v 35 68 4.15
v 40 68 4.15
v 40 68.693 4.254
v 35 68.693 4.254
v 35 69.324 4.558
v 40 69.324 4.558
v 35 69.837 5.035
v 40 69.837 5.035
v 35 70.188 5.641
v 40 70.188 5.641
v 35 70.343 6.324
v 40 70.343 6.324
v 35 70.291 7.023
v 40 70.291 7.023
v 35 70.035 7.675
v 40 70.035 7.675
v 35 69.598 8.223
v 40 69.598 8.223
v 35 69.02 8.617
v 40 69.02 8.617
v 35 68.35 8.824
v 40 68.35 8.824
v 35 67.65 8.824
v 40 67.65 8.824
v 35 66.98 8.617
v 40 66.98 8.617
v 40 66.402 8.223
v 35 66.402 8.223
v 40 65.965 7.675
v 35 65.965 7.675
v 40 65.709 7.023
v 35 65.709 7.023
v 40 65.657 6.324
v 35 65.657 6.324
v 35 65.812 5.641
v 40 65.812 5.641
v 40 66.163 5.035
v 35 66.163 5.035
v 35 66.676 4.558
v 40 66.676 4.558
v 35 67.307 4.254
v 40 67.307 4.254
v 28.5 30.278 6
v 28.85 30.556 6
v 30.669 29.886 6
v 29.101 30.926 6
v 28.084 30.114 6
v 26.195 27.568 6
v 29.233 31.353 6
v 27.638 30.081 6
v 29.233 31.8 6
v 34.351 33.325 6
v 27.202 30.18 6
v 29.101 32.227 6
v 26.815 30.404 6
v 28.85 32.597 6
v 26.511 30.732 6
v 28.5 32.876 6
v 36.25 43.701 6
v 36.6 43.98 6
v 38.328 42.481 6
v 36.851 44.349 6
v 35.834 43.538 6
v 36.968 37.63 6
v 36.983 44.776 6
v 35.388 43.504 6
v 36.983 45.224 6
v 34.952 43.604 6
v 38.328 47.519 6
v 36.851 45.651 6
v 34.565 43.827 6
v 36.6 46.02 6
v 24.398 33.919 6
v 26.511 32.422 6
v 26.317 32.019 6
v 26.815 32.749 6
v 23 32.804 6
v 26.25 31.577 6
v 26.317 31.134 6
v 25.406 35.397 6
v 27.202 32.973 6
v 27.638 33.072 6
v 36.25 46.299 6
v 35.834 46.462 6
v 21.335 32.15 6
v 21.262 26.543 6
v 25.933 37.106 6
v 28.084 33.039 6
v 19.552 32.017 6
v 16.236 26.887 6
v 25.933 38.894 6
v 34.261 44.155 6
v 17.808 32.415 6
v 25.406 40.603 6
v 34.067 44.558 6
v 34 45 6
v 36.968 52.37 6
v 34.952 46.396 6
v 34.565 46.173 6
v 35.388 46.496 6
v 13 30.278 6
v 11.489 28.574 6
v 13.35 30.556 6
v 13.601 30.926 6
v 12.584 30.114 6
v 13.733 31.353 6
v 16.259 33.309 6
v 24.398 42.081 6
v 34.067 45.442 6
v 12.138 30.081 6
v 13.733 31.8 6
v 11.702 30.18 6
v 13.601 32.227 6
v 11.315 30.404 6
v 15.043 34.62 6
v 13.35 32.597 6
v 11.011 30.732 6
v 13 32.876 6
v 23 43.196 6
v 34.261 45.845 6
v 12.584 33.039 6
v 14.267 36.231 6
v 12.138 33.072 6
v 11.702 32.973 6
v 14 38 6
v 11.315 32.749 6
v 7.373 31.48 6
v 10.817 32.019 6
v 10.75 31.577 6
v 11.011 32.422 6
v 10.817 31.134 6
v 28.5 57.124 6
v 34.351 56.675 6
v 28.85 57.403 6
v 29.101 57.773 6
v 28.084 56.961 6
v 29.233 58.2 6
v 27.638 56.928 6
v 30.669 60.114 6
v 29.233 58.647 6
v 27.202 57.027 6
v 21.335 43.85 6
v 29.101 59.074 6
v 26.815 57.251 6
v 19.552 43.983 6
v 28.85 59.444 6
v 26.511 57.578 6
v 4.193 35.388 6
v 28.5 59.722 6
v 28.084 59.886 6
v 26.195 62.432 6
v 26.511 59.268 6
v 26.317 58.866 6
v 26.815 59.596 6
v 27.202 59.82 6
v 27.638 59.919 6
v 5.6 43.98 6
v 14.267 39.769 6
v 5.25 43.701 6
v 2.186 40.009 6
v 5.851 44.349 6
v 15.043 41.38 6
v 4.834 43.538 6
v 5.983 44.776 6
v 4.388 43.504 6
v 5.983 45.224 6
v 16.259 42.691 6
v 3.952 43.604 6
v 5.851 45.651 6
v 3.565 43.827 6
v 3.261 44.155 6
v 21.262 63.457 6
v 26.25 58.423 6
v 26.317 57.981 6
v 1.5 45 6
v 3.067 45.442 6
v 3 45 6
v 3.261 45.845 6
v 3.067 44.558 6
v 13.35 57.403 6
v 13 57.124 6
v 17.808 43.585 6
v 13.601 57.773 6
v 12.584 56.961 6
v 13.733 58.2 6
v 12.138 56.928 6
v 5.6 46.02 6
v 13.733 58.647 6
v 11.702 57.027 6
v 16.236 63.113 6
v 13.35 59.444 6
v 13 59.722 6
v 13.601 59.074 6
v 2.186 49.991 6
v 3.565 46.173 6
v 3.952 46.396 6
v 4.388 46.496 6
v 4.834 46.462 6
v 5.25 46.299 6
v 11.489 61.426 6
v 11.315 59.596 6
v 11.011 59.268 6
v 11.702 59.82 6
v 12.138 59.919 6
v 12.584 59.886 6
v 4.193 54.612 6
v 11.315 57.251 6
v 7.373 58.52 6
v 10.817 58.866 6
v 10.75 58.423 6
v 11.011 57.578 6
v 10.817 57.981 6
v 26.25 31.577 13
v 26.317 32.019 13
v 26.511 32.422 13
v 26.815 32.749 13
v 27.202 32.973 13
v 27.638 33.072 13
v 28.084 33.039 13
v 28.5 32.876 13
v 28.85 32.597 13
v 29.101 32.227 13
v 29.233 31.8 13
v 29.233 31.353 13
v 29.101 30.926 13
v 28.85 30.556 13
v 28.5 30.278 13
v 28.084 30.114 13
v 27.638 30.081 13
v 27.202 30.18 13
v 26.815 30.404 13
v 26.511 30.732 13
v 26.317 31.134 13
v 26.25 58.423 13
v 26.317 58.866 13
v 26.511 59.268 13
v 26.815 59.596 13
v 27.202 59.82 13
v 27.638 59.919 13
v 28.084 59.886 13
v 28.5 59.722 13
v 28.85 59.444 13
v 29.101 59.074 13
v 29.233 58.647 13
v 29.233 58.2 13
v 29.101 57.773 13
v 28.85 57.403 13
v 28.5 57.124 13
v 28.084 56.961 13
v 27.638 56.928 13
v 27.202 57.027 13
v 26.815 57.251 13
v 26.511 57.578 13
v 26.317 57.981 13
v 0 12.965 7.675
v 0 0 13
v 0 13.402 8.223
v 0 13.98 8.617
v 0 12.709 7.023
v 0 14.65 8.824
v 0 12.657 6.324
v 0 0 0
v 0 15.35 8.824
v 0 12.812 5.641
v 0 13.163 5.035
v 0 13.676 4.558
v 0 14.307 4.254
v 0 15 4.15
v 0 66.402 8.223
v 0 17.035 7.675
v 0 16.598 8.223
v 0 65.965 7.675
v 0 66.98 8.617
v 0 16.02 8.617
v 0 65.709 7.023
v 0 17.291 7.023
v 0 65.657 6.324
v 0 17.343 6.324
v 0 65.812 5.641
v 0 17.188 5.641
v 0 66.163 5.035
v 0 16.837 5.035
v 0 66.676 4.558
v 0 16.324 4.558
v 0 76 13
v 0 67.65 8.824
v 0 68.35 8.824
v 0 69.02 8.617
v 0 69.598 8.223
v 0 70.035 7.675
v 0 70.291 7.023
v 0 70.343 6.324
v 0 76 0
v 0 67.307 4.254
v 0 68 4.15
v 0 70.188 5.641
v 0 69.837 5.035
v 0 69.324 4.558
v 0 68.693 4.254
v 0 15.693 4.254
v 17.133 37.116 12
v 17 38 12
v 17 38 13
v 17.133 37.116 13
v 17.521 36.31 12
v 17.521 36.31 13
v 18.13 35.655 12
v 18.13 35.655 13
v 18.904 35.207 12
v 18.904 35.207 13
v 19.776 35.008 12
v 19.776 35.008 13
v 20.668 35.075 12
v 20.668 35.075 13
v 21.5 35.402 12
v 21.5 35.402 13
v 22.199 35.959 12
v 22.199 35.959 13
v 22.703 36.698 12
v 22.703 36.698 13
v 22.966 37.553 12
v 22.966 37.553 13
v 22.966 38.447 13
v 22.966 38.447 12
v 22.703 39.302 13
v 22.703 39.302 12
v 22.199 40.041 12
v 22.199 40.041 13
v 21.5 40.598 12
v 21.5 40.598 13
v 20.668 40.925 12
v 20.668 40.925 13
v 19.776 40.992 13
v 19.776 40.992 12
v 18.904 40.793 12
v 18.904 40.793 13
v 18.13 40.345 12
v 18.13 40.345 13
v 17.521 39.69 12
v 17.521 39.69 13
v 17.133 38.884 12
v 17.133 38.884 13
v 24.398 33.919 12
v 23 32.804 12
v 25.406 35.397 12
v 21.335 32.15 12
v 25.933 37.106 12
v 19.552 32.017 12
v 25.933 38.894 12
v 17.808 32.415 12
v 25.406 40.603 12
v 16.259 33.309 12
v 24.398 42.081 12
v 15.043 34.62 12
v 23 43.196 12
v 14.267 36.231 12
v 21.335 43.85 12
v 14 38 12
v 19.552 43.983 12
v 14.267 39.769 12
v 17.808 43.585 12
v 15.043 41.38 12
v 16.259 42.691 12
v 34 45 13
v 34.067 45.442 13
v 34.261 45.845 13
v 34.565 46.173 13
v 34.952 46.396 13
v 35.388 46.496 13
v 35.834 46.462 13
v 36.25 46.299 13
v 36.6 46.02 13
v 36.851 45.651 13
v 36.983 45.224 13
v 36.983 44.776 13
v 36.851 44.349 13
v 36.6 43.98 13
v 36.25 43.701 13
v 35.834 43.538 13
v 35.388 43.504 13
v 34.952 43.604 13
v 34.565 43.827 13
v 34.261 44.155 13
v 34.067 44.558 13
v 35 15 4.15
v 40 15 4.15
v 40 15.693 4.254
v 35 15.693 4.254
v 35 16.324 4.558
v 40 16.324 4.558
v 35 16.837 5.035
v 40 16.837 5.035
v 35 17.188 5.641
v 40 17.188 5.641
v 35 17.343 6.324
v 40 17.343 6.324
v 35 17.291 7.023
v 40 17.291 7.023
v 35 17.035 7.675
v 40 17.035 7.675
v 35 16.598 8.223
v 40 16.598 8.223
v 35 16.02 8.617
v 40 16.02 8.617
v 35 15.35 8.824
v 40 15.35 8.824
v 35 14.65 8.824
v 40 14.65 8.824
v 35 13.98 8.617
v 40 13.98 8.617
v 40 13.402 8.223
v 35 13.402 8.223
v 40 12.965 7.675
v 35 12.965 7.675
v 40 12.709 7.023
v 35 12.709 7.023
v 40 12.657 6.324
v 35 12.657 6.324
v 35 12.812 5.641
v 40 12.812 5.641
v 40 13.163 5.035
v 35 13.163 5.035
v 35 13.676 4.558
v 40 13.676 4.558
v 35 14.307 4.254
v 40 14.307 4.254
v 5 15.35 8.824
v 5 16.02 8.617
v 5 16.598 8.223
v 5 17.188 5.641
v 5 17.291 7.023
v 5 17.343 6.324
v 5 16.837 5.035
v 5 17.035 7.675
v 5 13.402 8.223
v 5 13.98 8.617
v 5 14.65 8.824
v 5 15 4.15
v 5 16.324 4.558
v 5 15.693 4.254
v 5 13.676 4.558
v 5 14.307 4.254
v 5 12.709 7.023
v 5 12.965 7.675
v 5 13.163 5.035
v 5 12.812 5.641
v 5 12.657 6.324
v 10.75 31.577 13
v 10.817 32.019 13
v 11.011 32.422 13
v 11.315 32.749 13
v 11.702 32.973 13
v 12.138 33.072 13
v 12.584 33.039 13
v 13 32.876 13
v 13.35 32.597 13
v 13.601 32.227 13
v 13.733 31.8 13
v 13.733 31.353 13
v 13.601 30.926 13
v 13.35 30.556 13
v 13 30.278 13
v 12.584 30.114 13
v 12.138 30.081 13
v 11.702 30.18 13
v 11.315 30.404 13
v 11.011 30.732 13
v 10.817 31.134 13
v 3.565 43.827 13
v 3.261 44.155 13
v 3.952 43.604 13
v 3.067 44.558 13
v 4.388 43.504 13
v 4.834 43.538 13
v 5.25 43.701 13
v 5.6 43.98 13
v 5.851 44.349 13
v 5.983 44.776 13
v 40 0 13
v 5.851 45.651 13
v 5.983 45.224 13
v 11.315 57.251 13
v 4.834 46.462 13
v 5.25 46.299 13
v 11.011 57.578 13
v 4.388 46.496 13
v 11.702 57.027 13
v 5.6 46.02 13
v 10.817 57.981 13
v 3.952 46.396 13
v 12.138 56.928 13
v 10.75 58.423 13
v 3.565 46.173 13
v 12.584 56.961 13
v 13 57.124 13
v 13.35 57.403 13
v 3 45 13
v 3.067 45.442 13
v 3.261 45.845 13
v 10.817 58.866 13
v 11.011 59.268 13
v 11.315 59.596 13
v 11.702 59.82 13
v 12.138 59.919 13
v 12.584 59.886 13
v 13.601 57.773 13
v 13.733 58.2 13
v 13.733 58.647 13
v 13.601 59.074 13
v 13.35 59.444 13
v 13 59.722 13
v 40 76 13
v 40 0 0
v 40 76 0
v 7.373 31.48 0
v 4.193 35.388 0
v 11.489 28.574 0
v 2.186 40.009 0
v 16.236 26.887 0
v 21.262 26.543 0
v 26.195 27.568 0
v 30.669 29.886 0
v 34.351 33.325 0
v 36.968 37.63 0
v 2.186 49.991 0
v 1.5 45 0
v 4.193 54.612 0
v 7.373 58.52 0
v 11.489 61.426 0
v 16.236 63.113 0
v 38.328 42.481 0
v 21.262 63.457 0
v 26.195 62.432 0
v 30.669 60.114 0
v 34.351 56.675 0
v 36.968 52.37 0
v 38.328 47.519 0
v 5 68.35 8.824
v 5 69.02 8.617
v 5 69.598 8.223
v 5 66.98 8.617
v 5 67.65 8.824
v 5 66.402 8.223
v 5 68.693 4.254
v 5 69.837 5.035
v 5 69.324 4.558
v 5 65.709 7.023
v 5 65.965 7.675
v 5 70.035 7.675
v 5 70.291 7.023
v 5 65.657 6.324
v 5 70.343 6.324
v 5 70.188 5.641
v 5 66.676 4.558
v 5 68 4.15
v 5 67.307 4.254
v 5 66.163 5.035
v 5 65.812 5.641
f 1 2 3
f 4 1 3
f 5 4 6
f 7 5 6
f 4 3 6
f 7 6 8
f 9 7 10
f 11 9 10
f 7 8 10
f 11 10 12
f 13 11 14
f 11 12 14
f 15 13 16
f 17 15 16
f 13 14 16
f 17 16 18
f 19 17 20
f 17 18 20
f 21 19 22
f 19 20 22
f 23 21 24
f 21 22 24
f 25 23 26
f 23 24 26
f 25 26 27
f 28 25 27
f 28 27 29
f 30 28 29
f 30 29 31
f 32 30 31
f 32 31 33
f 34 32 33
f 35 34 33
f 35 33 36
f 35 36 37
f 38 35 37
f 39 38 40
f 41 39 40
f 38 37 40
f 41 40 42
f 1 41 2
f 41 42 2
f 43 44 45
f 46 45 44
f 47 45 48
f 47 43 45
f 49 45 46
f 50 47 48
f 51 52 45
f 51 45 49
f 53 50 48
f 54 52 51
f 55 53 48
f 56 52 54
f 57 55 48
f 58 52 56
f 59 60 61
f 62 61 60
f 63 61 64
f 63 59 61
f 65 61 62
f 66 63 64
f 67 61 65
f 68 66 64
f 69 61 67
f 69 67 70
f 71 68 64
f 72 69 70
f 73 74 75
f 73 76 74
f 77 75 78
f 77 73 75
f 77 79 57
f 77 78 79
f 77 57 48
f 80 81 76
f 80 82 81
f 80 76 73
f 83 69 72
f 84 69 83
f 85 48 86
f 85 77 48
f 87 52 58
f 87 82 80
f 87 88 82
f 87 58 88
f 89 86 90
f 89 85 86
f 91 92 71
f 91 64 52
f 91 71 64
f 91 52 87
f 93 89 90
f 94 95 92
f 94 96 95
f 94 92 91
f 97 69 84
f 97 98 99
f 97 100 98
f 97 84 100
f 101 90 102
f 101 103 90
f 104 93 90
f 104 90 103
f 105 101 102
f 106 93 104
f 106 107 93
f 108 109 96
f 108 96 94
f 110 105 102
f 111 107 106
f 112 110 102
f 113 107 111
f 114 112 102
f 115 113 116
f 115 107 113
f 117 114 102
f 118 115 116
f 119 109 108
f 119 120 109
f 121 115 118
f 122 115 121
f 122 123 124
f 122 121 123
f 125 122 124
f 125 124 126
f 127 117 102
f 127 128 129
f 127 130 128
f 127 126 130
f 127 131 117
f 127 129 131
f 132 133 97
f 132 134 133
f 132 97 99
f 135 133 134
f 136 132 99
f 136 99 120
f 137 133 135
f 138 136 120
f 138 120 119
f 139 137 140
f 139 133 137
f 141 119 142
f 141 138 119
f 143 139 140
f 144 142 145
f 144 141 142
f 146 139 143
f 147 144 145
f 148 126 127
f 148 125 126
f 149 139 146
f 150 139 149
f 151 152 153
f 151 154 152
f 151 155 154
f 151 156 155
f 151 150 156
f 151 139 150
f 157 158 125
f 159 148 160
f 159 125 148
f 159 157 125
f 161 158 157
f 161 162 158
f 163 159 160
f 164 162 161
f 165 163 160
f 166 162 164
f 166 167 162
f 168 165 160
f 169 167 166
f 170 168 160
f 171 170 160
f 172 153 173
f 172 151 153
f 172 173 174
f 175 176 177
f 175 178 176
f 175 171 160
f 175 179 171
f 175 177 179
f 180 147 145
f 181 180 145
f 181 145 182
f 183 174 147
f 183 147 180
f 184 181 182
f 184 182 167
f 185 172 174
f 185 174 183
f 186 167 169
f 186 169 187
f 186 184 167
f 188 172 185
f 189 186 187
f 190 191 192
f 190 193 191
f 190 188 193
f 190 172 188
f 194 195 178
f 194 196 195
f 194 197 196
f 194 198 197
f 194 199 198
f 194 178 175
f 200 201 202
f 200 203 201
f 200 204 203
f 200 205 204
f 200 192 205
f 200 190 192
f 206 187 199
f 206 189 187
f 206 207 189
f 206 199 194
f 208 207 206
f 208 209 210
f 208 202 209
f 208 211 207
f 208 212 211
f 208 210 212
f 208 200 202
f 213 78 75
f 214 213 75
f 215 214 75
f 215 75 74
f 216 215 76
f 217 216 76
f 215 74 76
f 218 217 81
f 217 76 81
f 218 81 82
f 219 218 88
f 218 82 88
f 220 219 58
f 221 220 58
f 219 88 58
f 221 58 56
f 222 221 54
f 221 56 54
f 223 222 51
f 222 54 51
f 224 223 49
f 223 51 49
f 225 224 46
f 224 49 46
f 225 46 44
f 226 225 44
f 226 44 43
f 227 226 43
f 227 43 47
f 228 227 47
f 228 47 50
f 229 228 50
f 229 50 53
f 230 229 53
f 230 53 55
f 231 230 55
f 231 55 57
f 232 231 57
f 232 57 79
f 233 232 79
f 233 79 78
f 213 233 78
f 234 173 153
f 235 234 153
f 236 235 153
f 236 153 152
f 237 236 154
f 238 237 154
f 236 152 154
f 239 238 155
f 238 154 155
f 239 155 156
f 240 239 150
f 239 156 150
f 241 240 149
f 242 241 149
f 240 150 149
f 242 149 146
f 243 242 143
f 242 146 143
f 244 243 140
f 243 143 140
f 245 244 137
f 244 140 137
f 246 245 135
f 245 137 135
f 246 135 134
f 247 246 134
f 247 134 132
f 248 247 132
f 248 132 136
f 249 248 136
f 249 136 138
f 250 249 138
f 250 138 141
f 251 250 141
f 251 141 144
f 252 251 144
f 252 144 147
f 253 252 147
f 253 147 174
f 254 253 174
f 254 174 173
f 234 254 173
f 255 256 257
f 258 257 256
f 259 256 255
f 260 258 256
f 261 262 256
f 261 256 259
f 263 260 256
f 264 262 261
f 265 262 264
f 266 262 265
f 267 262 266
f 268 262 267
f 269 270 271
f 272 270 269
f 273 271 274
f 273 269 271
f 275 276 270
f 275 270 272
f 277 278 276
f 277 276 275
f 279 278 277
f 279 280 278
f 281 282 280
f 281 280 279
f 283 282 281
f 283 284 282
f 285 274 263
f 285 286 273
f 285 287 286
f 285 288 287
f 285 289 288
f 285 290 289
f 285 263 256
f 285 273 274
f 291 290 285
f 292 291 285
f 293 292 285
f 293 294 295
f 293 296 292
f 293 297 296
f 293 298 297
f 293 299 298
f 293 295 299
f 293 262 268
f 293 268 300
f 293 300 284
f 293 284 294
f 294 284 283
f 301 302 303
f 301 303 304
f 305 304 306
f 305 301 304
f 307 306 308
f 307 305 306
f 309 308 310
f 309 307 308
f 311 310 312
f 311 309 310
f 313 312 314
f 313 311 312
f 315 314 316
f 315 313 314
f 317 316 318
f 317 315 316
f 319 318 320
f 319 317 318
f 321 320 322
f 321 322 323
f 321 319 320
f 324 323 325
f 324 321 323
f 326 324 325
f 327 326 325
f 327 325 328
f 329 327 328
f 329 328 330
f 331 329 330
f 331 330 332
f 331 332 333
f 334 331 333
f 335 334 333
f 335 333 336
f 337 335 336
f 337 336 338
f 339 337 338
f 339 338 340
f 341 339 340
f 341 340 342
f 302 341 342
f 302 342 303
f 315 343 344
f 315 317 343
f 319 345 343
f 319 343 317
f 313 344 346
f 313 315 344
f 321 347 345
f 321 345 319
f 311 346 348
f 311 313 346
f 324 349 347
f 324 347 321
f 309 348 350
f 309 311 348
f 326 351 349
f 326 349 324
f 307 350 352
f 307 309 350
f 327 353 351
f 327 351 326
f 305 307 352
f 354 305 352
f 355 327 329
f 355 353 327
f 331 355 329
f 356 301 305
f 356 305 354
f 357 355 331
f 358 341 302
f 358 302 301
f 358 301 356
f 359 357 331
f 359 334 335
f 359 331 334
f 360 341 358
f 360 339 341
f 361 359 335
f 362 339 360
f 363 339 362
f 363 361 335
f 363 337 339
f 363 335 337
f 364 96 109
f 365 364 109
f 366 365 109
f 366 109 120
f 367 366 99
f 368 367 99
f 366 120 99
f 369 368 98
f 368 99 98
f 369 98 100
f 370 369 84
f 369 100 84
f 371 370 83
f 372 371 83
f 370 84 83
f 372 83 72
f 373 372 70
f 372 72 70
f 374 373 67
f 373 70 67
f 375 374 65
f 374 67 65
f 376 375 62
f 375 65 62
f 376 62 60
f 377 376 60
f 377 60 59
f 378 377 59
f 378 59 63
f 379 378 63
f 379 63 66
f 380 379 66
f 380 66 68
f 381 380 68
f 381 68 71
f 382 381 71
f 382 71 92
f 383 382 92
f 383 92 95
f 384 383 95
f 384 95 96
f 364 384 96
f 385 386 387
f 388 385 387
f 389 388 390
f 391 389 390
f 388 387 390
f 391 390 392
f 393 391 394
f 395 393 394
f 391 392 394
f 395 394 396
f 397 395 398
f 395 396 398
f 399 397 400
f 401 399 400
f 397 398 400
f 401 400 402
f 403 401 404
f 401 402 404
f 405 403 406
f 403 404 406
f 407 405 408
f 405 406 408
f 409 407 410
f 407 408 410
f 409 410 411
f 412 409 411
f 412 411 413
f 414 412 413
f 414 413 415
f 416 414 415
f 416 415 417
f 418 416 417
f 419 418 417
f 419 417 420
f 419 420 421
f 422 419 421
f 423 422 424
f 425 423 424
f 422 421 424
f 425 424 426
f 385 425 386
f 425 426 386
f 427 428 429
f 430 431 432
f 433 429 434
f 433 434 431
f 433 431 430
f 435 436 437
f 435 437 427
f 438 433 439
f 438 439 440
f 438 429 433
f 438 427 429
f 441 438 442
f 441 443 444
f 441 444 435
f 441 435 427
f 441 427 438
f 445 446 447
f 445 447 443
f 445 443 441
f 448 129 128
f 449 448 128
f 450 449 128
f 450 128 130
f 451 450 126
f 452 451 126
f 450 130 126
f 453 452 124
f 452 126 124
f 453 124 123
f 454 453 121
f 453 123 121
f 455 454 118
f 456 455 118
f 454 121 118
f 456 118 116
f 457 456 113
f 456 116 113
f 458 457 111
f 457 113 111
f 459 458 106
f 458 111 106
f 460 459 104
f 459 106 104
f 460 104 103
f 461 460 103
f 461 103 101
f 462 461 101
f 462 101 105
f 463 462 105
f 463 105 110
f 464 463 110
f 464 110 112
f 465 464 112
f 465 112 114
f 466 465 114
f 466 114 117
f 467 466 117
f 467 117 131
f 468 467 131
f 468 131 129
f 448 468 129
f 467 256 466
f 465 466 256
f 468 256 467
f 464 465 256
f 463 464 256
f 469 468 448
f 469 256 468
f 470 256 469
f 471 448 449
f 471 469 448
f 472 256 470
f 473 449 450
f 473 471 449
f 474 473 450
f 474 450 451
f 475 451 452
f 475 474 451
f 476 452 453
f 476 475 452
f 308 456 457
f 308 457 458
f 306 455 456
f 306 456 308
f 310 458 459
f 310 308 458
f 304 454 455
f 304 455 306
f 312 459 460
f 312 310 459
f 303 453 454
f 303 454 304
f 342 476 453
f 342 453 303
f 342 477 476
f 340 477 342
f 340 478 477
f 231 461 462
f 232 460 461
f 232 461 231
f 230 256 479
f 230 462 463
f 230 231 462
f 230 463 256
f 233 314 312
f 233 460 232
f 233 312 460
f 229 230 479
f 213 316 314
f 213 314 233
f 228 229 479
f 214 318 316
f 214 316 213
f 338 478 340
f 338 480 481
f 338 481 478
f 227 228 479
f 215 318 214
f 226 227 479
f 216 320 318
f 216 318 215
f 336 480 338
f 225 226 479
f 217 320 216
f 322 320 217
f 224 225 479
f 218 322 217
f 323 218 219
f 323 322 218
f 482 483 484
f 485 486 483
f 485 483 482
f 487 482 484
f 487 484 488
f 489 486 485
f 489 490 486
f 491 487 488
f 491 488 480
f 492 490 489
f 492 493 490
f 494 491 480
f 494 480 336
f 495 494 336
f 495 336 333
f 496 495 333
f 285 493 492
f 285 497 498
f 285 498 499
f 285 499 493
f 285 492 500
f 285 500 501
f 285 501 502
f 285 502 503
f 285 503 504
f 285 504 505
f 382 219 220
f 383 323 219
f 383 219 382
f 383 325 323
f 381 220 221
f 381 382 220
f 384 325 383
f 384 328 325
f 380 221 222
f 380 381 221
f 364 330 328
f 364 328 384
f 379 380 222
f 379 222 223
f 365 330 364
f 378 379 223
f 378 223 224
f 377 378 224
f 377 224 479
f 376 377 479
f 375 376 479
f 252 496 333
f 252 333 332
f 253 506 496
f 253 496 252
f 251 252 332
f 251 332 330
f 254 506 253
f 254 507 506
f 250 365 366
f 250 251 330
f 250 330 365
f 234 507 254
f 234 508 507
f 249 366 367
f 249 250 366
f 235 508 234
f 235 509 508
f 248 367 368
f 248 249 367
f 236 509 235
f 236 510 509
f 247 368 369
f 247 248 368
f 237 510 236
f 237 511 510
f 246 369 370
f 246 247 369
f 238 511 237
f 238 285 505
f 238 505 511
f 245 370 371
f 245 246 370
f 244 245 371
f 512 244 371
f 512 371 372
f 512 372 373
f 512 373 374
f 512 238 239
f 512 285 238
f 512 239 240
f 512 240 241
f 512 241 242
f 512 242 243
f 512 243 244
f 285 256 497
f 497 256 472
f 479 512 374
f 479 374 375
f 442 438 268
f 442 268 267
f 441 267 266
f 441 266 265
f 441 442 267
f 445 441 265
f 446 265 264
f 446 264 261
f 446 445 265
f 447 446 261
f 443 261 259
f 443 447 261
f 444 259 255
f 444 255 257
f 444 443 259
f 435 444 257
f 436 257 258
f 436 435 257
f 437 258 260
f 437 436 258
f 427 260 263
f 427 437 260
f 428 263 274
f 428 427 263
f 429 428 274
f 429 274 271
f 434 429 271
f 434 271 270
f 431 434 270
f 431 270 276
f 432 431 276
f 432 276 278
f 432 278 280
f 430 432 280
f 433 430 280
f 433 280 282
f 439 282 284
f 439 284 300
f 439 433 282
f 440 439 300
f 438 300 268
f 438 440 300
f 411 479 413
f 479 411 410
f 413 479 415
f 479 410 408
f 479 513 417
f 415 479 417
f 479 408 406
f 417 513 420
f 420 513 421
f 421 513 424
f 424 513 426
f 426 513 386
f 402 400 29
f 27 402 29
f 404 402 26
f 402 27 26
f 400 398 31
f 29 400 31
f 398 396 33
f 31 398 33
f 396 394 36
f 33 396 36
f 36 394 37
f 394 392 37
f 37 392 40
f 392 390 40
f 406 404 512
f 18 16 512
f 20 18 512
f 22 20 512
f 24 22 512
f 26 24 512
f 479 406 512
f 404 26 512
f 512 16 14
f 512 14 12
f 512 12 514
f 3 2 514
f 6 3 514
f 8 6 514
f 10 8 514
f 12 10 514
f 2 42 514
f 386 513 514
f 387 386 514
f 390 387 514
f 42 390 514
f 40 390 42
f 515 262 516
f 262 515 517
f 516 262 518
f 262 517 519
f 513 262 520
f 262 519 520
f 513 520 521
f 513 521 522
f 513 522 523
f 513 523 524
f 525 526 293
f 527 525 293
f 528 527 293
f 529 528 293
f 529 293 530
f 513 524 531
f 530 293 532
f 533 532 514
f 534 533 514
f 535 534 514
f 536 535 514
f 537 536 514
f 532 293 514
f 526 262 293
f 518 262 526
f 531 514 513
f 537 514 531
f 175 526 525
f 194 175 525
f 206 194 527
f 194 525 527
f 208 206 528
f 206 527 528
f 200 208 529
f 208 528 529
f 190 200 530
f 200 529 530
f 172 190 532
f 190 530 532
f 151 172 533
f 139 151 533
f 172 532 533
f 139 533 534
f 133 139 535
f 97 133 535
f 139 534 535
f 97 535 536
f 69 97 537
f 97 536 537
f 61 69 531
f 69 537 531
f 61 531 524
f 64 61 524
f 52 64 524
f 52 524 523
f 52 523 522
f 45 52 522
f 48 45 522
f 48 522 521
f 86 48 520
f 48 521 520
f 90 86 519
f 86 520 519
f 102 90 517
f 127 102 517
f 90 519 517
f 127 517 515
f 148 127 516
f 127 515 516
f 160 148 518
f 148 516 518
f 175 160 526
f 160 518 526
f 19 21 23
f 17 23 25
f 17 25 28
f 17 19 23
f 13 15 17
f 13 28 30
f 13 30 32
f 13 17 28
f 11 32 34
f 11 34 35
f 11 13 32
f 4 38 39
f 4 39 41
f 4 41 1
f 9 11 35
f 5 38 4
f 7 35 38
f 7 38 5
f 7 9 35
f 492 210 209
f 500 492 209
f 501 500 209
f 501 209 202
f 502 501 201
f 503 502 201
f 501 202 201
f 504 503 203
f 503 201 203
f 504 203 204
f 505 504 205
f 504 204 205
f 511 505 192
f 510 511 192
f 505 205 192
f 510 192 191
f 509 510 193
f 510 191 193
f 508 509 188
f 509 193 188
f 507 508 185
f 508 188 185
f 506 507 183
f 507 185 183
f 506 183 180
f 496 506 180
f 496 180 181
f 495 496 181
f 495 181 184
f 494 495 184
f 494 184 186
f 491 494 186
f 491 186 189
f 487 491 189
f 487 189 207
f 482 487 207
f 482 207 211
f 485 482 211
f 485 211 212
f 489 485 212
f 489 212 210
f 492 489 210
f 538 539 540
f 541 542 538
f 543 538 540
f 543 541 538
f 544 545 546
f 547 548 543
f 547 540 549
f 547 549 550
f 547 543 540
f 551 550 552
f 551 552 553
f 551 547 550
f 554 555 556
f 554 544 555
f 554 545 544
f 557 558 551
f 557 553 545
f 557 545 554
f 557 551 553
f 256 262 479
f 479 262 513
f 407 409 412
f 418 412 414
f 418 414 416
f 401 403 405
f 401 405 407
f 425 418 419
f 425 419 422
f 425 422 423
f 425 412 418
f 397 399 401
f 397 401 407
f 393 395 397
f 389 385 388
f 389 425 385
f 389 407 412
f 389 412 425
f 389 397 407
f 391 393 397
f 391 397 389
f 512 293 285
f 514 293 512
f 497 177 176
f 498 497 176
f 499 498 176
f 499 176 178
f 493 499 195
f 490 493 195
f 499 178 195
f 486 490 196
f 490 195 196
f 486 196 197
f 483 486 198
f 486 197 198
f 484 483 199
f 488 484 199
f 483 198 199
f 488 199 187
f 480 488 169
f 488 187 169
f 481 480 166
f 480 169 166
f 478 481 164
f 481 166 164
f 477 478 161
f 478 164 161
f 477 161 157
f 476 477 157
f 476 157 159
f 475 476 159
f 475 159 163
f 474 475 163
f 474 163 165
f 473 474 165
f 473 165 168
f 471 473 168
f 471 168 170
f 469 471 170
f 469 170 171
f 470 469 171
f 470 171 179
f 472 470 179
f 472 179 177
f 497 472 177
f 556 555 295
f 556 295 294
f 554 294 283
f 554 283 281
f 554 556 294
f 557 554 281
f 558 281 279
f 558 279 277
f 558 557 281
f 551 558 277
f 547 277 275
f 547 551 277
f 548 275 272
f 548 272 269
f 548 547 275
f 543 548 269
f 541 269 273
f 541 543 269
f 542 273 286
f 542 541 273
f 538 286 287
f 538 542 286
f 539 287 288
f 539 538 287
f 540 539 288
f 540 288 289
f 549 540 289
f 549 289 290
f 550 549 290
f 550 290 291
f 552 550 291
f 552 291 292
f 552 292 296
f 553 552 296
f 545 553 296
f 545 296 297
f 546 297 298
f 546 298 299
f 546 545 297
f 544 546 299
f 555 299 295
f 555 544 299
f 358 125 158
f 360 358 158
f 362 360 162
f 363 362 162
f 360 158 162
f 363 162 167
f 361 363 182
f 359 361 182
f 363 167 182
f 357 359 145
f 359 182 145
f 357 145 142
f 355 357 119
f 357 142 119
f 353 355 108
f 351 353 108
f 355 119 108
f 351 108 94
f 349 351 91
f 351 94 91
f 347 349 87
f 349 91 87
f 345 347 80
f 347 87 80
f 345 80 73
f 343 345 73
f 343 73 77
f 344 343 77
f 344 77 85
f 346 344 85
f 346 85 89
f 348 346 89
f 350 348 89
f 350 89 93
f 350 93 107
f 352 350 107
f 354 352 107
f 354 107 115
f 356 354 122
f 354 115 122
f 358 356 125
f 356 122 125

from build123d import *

# Parameters (mm, degrees)
CROQUIS1_W              = 40
CROQUIS1_H              = 76
CROQUIS1_R              = 3
SALIENTE_EXTRUIR1_DEPTH = 13
CROQUIS5_R              = 18.5
CORTAR_EXTRUIR3_DEPTH   = 6
CROQUIS6_R              = 1.5
CORTAR_EXTRUIR4_DEPTH   = 87.168439698
CROQUIS7_R              = 6
CORTAR_EXTRUIR5_DEPTH   = 6
CROQUIS8_R              = 2.35
CORTAR_EXTRUIR6_DEPTH   = 5
CORTAR_EXTRUIR7_START   = -5
CROQUIS9_R              = 2.35
CORTAR_EXTRUIR7_DEPTH   = 5


with BuildPart() as part:
    # Croquis1 → Saliente-Extruir1 (new body)
    with BuildSketch(Plane.XY):
        with Locations((20, 38)):
            Rectangle(CROQUIS1_W, CROQUIS1_H)
        with Locations(Location((20, 38, 0), (0, 0, 180))):
            Circle(CROQUIS1_R, mode=Mode.SUBTRACT)
    extrude(amount=SALIENTE_EXTRUIR1_DEPTH)

    # Croquis5 → Cortar-Extruir3 (cut)
    with BuildSketch(Plane(origin=(0, 0, 0), x_dir=(-1, 0, 0), z_dir=(0, 0, -1))):
        with Locations((-20, 45)):
            Circle(CROQUIS5_R)
    extrude(amount=-CORTAR_EXTRUIR3_DEPTH, mode=Mode.SUBTRACT)

    # Croquis6 → Cortar-Extruir4 (cut, through all)
    with BuildSketch(Plane(origin=(0, 0, 6), x_dir=(-1, 0, 0), z_dir=(0, 0, -1))):
        with Locations((-35.5, 45)):
            Circle(CROQUIS6_R)
        with Locations((-27.75, 58.423393759)):
            Circle(CROQUIS6_R)
        with Locations((-12.25, 58.423393759)):
            Circle(CROQUIS6_R)
        with Locations((-4.5, 45)):
            Circle(CROQUIS6_R)
        with Locations((-12.25, 31.576606241)):
            Circle(CROQUIS6_R)
        with Locations((-27.75, 31.576606241)):
            Circle(CROQUIS6_R)
    extrude(amount=-CORTAR_EXTRUIR4_DEPTH, mode=Mode.SUBTRACT)

    # Croquis7 → Cortar-Extruir5 (cut)
    with BuildSketch(Plane(origin=(0, 0, 6), x_dir=(-1, 0, 0), z_dir=(0, 0, -1))):
        with Locations((-20, 38)):
            Circle(CROQUIS7_R)
    extrude(amount=-CORTAR_EXTRUIR5_DEPTH, mode=Mode.SUBTRACT)

    # Croquis8 → Cortar-Extruir6 (cut)
    with BuildSketch(Plane(origin=(40, 0, 0), x_dir=(0, 0, -1), z_dir=(1, 0, 0))):
        with Locations((-6.5, 68)):
            Circle(CROQUIS8_R)
        with Locations((-6.5, 15)):
            Circle(CROQUIS8_R)
    extrude(amount=-CORTAR_EXTRUIR6_DEPTH, mode=Mode.SUBTRACT)

    # Croquis9 → Cortar-Extruir7 (cut)
    with BuildSketch(Plane.ZY.offset(CORTAR_EXTRUIR7_START)):
        with Locations(Location((6.5, 68, 0), (0, 0, 180))):
            Circle(CROQUIS9_R)
        with Locations(Location((6.5, 15, 0), (0, 0, 180))):
            Circle(CROQUIS9_R)
    extrude(amount=CORTAR_EXTRUIR7_DEPTH, mode=Mode.SUBTRACT)


solid = part.part
